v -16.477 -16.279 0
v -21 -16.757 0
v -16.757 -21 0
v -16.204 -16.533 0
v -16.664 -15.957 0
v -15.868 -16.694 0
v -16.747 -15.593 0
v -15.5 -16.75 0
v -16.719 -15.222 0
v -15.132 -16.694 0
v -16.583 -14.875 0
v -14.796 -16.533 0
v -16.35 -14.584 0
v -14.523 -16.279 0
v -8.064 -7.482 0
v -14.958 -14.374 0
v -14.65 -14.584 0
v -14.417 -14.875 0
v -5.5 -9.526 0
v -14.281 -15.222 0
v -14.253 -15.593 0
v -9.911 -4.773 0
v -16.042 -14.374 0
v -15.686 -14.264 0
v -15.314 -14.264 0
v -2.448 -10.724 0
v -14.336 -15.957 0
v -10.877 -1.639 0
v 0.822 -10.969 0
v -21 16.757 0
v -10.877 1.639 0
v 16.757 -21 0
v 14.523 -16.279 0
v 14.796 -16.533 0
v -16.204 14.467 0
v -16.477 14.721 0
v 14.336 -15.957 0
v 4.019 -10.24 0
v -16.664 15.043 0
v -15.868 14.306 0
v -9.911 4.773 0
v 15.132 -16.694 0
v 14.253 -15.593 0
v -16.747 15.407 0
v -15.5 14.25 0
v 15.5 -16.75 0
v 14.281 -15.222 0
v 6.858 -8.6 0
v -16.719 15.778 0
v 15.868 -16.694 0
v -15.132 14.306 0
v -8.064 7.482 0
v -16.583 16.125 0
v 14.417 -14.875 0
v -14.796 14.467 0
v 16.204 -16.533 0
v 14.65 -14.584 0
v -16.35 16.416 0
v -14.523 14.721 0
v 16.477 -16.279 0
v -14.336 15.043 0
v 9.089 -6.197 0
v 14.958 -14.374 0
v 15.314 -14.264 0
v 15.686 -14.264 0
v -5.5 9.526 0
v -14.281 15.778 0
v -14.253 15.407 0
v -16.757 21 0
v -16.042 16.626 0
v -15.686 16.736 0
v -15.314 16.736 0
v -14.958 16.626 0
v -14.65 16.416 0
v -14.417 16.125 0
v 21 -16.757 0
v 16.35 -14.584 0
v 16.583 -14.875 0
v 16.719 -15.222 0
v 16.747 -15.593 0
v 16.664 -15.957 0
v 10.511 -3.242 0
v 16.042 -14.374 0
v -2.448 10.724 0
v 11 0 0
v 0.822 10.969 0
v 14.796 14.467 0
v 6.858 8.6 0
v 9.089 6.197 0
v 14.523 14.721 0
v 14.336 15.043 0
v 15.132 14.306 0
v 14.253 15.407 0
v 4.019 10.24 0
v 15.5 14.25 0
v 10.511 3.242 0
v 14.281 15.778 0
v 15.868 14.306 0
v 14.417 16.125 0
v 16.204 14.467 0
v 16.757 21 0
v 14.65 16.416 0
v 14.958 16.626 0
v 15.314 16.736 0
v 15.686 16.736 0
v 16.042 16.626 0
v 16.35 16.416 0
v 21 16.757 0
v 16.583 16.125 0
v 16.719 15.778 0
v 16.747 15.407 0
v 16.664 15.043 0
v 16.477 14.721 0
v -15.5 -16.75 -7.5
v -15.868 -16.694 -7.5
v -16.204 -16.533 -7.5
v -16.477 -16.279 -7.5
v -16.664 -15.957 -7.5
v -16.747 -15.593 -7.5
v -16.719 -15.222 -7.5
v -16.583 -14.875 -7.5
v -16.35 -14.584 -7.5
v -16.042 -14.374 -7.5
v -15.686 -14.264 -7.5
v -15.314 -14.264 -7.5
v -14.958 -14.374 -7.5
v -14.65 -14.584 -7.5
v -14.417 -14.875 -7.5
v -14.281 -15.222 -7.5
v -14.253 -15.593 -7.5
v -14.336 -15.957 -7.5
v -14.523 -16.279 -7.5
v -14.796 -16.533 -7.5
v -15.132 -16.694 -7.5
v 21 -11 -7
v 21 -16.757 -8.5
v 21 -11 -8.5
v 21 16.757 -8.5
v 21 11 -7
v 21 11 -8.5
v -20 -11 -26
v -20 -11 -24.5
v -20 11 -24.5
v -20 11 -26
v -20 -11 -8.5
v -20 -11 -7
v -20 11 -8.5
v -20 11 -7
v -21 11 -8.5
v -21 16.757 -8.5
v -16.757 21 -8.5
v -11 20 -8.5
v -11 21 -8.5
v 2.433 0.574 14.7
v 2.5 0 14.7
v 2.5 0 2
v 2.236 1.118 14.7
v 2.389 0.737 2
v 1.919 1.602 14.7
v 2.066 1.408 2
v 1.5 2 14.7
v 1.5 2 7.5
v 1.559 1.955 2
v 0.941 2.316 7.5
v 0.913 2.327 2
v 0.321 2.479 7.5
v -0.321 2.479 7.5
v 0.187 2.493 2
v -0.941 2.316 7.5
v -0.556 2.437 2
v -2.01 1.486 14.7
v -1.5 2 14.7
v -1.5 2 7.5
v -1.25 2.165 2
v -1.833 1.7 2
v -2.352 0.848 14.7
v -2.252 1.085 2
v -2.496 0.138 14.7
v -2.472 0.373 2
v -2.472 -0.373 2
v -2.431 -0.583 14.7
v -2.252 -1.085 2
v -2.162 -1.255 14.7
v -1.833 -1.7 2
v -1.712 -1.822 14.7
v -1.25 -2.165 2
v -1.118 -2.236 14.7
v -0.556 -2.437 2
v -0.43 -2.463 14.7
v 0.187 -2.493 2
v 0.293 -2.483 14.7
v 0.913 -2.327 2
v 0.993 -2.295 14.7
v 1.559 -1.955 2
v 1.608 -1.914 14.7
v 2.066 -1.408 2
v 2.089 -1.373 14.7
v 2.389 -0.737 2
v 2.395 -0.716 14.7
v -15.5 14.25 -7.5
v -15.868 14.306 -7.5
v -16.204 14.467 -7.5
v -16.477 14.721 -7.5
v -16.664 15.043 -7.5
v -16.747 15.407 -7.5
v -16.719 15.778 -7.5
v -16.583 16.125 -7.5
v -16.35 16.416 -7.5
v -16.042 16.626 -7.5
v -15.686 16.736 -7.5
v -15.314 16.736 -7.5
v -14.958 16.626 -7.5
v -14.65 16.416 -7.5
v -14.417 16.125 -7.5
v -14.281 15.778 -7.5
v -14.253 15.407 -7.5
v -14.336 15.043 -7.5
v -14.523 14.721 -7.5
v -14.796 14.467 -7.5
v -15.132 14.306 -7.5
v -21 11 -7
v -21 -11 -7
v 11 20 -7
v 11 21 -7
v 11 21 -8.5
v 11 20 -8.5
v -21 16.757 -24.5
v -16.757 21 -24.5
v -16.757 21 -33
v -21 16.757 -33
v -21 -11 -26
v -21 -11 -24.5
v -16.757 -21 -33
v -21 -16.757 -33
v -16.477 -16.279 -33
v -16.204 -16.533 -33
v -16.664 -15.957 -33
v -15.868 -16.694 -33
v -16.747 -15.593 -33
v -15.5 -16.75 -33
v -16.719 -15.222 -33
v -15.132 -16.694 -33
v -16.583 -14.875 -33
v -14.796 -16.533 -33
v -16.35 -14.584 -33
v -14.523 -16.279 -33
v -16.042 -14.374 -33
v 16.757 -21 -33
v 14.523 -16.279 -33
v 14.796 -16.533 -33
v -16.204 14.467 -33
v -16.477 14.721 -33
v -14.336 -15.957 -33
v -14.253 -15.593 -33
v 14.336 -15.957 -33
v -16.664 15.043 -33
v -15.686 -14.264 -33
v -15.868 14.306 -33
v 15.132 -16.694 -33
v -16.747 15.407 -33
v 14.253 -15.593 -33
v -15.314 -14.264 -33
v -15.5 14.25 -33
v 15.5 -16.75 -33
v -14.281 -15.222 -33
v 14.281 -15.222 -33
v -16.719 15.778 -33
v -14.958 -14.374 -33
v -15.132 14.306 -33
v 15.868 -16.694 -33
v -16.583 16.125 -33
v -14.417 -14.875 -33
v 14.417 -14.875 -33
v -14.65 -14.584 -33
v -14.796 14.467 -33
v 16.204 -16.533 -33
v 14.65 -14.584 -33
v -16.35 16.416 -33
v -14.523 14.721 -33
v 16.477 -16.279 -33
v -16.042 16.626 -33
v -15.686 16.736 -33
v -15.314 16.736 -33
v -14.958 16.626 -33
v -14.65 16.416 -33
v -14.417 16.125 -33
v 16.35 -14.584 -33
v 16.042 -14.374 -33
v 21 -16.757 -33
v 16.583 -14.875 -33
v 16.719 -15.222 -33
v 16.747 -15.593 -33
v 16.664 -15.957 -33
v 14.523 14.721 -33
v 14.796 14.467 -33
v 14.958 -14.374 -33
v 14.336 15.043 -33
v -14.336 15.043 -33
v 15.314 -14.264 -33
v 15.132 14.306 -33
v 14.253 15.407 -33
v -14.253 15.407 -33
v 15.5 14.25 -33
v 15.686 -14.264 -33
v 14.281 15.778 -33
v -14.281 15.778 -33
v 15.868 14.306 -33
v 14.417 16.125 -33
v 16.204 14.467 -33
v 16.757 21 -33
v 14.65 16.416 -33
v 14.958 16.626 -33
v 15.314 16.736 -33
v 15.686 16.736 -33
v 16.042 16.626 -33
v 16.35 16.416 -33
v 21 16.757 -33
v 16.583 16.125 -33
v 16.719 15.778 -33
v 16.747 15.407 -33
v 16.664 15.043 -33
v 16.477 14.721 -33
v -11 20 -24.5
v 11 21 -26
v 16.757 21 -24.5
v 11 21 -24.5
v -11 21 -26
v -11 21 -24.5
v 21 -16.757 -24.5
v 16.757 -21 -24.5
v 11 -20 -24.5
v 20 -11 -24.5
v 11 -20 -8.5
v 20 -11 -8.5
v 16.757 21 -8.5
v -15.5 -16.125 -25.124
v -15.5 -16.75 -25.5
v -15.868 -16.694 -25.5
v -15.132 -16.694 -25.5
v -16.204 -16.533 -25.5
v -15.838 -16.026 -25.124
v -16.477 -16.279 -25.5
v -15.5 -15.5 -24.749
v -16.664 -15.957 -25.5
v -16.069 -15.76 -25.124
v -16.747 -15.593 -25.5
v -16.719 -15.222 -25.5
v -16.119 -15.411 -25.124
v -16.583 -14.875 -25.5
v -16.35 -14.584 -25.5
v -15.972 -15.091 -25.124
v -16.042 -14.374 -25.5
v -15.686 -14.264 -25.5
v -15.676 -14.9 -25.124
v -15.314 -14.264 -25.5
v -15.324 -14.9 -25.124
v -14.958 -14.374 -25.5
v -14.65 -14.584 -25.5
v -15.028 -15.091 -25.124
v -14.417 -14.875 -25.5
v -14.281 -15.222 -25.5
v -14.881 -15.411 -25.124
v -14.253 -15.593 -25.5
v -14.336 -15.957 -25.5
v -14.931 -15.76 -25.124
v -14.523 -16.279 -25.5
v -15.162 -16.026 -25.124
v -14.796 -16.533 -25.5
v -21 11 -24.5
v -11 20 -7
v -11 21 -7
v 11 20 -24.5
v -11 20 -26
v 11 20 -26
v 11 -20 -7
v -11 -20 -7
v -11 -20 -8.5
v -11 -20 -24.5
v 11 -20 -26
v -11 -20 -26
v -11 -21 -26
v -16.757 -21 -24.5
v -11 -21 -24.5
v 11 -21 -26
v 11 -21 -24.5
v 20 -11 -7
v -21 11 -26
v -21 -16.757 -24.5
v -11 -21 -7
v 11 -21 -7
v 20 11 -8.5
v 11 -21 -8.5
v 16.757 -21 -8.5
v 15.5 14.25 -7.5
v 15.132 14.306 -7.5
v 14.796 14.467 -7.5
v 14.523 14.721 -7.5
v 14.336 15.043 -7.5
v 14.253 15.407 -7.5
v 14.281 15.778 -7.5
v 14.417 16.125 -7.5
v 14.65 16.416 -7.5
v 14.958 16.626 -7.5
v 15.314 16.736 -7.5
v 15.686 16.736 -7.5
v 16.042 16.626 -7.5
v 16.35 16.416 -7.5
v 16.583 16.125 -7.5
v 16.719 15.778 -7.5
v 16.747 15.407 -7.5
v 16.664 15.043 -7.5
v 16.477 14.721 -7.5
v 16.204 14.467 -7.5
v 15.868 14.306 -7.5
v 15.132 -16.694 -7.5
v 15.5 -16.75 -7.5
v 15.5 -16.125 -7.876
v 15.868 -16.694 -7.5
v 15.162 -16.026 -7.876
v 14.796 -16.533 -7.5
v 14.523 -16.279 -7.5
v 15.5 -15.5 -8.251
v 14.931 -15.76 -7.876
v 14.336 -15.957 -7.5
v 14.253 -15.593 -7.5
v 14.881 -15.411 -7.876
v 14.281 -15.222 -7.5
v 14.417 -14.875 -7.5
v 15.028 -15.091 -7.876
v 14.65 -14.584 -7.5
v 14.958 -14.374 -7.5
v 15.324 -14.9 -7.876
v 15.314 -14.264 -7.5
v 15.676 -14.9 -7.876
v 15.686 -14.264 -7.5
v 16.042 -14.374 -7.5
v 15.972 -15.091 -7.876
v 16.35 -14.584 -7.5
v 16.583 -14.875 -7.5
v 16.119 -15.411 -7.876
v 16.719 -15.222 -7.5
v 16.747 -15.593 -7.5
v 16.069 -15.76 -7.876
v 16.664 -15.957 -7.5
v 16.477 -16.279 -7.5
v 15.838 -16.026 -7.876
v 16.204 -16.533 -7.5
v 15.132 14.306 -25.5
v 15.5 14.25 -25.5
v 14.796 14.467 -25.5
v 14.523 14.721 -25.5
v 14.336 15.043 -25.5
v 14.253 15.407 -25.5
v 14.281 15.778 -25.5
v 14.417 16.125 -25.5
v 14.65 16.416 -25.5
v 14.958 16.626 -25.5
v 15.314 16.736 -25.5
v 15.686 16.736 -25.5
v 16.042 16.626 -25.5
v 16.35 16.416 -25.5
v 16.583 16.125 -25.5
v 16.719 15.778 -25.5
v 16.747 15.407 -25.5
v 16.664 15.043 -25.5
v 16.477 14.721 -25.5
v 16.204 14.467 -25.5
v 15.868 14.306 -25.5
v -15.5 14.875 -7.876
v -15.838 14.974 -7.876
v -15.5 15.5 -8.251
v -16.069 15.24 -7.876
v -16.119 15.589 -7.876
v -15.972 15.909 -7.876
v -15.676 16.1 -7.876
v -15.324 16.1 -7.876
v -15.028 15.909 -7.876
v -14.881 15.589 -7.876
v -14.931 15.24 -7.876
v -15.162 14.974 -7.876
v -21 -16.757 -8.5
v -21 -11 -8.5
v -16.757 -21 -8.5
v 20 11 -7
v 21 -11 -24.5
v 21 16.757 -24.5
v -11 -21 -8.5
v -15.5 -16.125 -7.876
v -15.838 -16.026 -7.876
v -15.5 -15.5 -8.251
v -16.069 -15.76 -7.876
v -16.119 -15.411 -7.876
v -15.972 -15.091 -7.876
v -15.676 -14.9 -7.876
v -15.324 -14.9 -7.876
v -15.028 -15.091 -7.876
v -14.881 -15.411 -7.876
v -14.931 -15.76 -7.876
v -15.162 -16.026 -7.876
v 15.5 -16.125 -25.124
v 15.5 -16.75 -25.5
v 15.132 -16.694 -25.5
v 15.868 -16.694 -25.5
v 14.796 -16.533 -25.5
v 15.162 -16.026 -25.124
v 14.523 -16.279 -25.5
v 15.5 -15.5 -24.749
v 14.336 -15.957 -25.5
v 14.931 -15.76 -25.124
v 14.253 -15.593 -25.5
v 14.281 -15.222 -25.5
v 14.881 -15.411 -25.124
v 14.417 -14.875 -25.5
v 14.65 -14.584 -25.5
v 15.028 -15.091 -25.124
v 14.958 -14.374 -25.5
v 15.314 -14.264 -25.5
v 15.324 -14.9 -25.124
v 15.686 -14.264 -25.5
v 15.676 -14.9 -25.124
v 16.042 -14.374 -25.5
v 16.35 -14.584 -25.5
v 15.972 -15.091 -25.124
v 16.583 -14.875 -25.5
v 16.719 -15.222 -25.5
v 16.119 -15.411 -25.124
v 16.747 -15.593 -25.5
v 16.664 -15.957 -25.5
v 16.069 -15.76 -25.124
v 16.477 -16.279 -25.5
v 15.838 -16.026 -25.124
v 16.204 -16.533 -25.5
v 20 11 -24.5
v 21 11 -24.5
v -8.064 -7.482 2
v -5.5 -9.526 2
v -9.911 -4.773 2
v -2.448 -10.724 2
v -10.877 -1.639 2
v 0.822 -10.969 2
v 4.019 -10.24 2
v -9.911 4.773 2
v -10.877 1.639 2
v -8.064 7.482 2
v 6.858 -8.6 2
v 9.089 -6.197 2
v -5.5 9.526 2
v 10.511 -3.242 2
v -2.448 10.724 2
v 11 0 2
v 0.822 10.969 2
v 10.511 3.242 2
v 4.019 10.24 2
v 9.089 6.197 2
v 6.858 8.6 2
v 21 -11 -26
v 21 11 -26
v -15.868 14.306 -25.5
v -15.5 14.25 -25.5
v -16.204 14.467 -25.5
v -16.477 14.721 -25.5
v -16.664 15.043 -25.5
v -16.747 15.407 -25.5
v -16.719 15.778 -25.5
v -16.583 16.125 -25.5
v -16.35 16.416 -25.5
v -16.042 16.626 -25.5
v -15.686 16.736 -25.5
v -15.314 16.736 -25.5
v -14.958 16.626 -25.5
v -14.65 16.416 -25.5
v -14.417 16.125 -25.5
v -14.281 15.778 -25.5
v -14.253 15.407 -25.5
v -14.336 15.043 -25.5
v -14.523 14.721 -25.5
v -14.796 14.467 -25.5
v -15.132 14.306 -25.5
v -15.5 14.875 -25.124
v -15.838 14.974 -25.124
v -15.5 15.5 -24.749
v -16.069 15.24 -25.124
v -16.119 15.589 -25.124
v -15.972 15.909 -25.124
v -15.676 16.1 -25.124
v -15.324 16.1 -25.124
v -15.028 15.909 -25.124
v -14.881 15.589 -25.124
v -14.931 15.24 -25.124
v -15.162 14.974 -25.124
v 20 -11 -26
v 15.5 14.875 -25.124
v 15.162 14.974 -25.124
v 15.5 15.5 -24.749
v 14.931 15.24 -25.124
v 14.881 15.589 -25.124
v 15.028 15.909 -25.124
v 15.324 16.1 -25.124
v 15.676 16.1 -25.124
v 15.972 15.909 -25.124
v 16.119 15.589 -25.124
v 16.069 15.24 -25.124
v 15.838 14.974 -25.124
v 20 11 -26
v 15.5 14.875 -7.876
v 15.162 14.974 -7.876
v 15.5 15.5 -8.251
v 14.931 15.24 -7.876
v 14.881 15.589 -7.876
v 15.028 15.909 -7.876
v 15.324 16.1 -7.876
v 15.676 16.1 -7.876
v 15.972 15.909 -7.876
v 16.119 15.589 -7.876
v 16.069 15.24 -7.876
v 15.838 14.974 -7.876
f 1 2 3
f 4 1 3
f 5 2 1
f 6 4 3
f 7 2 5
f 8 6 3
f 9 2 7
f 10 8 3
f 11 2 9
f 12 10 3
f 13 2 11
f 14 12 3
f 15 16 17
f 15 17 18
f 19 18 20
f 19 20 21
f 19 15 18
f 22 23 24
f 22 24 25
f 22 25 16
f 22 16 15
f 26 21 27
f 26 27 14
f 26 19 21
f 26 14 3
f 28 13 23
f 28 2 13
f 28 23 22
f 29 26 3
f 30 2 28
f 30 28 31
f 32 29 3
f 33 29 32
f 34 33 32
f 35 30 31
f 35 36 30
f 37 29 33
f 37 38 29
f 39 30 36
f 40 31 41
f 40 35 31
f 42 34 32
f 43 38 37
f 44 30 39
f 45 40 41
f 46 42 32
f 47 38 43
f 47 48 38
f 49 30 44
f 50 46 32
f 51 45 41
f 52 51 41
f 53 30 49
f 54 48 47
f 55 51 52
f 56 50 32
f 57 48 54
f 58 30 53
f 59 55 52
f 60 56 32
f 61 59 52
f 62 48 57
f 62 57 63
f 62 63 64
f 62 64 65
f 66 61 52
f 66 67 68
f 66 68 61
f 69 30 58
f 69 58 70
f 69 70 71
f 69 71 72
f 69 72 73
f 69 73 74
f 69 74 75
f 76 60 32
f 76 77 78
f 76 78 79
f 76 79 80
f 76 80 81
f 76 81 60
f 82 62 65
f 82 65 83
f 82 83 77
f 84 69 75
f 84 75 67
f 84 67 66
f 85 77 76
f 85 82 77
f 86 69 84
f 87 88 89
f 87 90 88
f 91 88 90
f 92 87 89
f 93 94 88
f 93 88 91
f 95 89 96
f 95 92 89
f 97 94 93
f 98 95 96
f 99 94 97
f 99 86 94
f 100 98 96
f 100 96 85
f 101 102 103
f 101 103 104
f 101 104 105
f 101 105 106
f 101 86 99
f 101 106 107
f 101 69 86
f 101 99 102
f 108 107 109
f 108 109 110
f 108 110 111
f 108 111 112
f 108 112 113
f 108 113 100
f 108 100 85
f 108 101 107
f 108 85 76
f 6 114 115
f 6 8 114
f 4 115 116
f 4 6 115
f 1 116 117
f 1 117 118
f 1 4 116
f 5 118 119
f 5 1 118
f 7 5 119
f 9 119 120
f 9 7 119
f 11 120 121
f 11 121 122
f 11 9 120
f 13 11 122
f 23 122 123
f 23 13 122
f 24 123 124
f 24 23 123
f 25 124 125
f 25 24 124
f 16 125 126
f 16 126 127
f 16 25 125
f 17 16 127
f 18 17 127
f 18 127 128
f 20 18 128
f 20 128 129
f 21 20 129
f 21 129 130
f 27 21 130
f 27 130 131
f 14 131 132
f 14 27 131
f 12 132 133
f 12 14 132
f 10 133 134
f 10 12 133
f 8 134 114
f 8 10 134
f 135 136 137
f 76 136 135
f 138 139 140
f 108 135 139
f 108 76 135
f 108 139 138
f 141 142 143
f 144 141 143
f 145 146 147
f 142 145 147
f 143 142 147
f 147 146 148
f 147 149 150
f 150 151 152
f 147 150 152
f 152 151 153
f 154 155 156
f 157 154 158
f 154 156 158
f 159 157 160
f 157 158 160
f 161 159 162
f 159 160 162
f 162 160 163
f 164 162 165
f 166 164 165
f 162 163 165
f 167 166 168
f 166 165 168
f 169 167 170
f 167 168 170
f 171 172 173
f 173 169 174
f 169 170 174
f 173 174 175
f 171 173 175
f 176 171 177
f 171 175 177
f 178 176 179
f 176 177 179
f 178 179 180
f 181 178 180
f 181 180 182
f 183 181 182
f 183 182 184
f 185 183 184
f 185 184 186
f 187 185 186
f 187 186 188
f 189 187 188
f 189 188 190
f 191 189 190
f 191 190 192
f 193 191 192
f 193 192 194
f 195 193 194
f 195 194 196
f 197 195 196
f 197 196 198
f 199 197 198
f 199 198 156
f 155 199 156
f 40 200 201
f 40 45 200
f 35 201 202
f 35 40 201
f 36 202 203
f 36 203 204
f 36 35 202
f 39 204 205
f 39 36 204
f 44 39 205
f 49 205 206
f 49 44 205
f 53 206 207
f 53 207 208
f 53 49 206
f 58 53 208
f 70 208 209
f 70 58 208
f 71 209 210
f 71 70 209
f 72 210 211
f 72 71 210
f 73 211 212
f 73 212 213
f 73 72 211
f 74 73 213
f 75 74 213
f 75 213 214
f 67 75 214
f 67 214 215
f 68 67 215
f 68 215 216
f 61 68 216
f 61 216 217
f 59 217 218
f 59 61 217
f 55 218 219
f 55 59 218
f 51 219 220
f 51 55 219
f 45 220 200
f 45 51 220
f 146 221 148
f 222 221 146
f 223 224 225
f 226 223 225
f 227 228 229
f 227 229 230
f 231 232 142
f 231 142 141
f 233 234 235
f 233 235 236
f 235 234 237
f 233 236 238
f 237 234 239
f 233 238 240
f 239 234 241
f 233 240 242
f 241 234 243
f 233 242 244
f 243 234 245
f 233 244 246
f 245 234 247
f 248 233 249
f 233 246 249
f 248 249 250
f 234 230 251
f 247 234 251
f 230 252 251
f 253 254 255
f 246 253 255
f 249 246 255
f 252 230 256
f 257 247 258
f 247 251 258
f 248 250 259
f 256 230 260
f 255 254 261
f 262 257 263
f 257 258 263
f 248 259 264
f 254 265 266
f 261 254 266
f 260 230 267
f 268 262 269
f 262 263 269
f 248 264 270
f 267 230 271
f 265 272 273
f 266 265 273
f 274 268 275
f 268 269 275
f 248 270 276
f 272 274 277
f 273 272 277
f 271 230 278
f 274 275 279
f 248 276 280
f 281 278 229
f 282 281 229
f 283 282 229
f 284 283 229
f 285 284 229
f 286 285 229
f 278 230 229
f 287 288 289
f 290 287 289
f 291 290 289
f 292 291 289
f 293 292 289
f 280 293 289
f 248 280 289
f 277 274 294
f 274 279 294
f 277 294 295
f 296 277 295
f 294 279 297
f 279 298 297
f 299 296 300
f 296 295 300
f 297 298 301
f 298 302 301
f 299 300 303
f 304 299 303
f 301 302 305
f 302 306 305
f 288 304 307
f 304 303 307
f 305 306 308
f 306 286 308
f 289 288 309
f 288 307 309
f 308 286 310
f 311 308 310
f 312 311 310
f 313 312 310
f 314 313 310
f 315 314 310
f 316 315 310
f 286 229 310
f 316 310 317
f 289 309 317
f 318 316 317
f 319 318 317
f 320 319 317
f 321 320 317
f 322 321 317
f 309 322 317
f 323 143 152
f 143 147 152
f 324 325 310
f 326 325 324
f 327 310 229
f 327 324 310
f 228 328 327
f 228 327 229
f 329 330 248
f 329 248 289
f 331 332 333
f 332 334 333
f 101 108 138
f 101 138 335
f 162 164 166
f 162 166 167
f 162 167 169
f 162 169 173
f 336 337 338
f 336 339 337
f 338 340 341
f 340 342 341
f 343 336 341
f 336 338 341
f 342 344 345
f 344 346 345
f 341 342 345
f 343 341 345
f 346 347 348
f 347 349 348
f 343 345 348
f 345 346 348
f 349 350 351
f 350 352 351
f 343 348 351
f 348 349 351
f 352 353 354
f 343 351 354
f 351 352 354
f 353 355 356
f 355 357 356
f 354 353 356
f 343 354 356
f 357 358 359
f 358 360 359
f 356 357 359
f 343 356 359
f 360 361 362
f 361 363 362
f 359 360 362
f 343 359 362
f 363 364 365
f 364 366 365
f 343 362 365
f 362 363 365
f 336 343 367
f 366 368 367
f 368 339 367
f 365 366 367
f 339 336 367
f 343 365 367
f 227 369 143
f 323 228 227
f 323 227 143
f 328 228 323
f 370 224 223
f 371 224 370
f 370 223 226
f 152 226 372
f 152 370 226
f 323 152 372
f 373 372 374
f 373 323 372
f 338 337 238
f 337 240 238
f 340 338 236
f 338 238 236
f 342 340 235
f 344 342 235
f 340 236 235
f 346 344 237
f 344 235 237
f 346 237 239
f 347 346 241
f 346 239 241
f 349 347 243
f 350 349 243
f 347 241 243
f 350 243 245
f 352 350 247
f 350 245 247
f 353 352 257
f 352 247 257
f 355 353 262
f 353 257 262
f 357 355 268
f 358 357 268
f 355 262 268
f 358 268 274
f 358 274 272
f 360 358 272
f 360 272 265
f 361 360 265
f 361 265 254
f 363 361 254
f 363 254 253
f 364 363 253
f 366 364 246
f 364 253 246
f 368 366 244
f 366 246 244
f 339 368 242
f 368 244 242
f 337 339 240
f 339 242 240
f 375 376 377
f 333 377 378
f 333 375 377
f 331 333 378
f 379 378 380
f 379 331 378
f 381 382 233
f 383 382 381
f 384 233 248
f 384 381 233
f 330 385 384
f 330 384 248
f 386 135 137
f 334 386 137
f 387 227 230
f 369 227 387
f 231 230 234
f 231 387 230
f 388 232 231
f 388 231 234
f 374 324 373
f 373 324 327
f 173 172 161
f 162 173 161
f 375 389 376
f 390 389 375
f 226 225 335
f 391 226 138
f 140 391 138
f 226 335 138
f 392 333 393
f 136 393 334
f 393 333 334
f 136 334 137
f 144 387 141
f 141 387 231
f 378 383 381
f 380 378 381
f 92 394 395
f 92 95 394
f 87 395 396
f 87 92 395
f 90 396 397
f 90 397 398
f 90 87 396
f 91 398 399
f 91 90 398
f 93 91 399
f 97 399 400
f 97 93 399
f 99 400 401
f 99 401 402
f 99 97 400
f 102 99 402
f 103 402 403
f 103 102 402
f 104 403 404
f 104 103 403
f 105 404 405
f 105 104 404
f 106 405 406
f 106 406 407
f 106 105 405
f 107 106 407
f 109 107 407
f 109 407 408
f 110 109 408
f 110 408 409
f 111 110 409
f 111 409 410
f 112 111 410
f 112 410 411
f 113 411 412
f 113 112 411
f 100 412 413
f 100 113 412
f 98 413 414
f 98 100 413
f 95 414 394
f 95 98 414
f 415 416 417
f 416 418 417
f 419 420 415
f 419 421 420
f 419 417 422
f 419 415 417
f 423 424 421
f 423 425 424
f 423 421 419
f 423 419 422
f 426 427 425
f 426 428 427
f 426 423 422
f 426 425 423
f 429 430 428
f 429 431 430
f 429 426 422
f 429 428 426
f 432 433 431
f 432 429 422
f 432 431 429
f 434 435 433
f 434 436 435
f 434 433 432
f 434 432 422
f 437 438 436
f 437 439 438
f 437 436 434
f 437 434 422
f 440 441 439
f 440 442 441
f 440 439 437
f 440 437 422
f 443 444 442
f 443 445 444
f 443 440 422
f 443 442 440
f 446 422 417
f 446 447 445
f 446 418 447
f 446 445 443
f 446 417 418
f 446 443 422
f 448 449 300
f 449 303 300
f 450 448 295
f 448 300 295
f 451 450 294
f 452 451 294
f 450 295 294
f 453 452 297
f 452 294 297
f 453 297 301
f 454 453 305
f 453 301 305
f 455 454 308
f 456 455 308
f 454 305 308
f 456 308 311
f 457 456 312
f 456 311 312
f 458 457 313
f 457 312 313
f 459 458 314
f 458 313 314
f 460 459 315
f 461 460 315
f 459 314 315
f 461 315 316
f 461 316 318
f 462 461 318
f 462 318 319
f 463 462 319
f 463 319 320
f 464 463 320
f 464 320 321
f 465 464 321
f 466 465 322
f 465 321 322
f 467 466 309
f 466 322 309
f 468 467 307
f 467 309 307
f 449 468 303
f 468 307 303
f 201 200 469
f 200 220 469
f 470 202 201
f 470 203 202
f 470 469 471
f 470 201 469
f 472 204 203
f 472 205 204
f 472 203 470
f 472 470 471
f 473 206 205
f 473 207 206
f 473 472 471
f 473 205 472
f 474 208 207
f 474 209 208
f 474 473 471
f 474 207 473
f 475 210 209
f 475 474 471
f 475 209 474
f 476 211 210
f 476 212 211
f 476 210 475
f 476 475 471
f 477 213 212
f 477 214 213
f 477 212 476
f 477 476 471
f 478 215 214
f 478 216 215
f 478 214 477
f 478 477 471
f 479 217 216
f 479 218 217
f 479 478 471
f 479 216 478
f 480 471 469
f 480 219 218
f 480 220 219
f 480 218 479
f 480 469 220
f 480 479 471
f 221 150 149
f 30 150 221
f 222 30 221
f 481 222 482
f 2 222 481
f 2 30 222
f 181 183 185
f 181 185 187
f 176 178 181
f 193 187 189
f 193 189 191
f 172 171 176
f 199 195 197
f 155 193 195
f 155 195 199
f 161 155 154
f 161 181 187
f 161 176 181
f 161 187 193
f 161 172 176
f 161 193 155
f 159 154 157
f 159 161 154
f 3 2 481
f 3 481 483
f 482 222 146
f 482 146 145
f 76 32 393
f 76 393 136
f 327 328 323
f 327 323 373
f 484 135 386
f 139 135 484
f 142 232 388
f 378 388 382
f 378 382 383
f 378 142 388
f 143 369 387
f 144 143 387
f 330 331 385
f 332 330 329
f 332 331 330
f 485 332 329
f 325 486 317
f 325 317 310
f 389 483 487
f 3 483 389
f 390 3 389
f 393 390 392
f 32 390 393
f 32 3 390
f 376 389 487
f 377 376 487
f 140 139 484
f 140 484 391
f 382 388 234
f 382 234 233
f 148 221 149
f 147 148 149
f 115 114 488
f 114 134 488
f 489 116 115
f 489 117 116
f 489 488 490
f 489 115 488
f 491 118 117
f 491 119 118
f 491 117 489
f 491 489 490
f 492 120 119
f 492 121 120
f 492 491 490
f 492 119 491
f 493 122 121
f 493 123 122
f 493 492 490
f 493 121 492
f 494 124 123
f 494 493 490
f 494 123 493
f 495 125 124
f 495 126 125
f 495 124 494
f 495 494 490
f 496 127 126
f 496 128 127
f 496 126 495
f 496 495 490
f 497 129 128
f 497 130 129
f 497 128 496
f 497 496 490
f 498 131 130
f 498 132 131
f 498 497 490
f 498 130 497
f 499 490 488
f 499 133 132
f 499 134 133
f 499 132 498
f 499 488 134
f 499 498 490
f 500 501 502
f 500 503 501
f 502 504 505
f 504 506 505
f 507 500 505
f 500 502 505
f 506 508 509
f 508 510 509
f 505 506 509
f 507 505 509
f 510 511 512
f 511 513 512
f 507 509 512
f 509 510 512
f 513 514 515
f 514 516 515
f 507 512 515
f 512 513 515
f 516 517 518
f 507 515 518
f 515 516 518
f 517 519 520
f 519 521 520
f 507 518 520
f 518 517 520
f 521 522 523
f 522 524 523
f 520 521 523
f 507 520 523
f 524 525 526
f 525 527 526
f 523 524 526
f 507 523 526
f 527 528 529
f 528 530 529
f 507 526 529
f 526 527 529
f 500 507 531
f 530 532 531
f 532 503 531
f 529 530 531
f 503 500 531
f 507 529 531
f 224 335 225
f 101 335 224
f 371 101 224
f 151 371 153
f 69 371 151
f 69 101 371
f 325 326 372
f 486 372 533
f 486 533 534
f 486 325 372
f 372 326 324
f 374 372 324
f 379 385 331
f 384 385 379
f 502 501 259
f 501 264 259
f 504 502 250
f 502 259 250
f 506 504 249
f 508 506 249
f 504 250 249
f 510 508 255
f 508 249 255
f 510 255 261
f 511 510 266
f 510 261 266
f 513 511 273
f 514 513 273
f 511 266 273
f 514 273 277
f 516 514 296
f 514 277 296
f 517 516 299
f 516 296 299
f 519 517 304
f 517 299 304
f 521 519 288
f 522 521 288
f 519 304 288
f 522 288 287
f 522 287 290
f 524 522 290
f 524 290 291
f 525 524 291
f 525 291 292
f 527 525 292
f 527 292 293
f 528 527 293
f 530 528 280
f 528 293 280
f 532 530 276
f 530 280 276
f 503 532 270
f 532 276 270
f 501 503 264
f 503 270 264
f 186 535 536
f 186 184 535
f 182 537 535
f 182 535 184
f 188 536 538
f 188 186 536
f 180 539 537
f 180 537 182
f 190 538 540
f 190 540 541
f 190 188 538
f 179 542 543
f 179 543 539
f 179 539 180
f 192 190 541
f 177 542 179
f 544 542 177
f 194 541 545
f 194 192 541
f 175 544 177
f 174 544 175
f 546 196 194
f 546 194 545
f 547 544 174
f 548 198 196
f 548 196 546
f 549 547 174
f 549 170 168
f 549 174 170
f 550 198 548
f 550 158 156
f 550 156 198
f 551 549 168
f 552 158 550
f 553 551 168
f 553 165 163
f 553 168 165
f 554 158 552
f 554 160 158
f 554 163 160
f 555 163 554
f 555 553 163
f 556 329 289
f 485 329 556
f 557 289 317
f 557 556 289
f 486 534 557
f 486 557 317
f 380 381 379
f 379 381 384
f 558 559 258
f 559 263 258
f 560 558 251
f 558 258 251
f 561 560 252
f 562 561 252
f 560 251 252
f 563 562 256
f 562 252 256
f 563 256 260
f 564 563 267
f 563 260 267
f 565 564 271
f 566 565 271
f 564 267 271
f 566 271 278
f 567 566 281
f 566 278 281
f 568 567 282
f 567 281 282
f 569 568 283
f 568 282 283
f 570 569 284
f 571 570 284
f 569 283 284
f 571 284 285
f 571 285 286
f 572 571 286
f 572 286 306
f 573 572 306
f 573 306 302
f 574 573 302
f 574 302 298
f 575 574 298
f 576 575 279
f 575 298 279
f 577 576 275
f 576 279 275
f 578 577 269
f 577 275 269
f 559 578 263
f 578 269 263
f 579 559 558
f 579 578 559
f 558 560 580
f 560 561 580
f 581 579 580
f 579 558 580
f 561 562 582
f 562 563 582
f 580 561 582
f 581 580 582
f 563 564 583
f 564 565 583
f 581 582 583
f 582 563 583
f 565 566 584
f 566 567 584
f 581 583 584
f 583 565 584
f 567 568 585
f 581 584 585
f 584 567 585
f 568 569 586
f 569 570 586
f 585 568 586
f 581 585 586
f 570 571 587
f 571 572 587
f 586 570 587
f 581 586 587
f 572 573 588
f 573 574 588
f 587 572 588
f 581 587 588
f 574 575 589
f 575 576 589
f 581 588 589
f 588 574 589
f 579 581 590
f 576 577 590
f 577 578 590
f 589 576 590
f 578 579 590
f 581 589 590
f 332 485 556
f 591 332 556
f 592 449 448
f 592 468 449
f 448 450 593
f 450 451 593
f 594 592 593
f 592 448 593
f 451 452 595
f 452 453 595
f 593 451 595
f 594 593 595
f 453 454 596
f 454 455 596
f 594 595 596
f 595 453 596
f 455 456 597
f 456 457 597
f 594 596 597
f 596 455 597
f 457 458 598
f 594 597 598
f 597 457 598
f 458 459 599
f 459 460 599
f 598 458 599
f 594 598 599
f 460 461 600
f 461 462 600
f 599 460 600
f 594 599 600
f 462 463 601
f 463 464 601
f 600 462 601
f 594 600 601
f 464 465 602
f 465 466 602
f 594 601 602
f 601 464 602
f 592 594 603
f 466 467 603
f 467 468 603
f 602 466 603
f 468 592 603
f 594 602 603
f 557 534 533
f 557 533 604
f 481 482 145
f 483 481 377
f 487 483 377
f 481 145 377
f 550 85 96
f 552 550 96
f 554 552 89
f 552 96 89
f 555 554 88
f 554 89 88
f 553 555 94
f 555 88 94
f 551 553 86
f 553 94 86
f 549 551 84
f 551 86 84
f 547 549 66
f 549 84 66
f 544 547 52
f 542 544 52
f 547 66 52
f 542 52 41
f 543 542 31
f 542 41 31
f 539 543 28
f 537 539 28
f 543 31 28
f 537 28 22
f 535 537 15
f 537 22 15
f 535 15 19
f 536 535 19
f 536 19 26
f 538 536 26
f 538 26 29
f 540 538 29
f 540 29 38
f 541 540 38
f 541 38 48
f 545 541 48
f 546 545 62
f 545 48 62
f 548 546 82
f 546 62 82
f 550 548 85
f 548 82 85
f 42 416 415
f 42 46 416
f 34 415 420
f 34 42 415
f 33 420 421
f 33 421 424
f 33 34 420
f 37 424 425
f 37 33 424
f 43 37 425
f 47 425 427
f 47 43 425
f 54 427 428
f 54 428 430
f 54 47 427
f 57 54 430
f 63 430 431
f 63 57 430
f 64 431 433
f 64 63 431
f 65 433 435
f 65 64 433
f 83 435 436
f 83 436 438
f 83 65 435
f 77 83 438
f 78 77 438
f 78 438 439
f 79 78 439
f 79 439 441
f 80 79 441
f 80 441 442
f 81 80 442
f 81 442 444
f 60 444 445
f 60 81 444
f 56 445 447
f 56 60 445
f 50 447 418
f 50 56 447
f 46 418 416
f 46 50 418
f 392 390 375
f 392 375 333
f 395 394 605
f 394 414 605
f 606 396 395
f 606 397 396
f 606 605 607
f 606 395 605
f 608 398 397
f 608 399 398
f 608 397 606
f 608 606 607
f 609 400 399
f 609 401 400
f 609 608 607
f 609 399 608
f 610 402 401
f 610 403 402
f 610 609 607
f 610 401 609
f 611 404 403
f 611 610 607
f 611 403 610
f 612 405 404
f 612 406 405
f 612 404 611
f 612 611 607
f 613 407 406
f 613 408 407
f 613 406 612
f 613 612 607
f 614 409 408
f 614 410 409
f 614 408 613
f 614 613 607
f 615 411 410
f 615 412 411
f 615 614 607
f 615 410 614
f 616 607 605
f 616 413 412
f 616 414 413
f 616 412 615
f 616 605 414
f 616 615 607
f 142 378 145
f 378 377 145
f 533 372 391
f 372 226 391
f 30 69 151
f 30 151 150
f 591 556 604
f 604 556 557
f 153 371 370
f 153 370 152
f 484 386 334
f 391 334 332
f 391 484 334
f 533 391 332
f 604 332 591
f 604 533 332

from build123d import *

# Parameters (mm, degrees)
BOSS_EXTRUDE1_DEPTH            = 33
M3X0_5_TAPPED_HOLE1_AT_2_COUNT = 2
M3X0_5_TAPPED_HOLE1_AT_2_PITCH = 43.840620434
M3X0_5_TAPPED_HOLE1_AT_3_COUNT = 2
M3X0_5_TAPPED_HOLE1_AT_3_PITCH = 31
M3X0_5_TAPPED_HOLE1_AT_4_COUNT = 2
M3X0_5_TAPPED_HOLE1_AT_4_PITCH = 31
SKETCH4_OUTSIDE_W              = 57.59
SKETCH4_OUTSIDE_H              = 57.59
CUT_EXTRUDE1_DEPTH             = 8
SKETCH5_W                      = 19
SKETCH5_H                      = 22
CUT_EXTRUDE2_DEPTH             = 1
CIRPATTERN1_COUNT              = 4
SKETCH7_R                      = 11
BOSS_EXTRUDE2_DEPTH            = 2
SKETCH8_R                      = 2.5
BOSS_EXTRUDE3_DEPTH            = 12.7
CUT_EXTRUDE3_DEPTH             = 7.2


with BuildPart() as part:
    # Sketch1 → Boss-Extrude1 (new body)
    with BuildSketch(Plane.XY):
        Polygon((16.757359313, 21), (-16.757359313, 21), (-21, 16.757359313), (-21, -16.757359313), (-16.757359313, -21), (16.757359313, -21), (21, -16.757359313), (21, 16.757359313), align=None)
    extrude(amount=-BOSS_EXTRUDE1_DEPTH)

    # Sketch2 → M3x0.5 Tapped Hole1 (revolve, cut)
    with BuildSketch(Plane(origin=(-15.5, 15.5, 0), x_dir=(0, -1, 0), z_dir=(1, 0, 0))):
        Polygon((0, 0), (0, 8.251075774), (1.25, 7.5), (1.25, 0), align=None)
    m3x0_5_tapped_hole1 = revolve(axis=Axis((-15.5, 15.5, 6.35), (0, 0, -1)), mode=Mode.SUBTRACT)

    # M3x0.5 Tapped Hole1 at 2: M3x0.5 Tapped Hole1 ×2
    with Locations(*[Vector(0.707106781, -0.707106781, 0) * (i * M3X0_5_TAPPED_HOLE1_AT_2_PITCH) for i in range(1, M3X0_5_TAPPED_HOLE1_AT_2_COUNT)]):
        add(m3x0_5_tapped_hole1, mode=Mode.SUBTRACT)

    # M3x0.5 Tapped Hole1 at 3: M3x0.5 Tapped Hole1 ×2
    with Locations(*[(i * M3X0_5_TAPPED_HOLE1_AT_3_PITCH, 0, 0) for i in range(1, M3X0_5_TAPPED_HOLE1_AT_3_COUNT)]):
        add(m3x0_5_tapped_hole1, mode=Mode.SUBTRACT)

    # M3x0.5 Tapped Hole1 at 4: M3x0.5 Tapped Hole1 ×2
    with Locations(*[(0, -i * M3X0_5_TAPPED_HOLE1_AT_4_PITCH, 0) for i in range(1, M3X0_5_TAPPED_HOLE1_AT_4_COUNT)]):
        add(m3x0_5_tapped_hole1, mode=Mode.SUBTRACT)

    # Sketch4 outside → Cut-Extrude1 (cut, symmetric)
    with BuildSketch(Plane.XY.offset(-16.5)):
        Rectangle(SKETCH4_OUTSIDE_W, SKETCH4_OUTSIDE_H)
        Polygon((11, -20), (-11, -20), (-20, -11), (-20, 11), (-11, 20), (11, 20), (20, 11), (20, -11), align=None, mode=Mode.SUBTRACT)
    extrude(amount=CUT_EXTRUDE1_DEPTH, both=True, mode=Mode.SUBTRACT)

    # Sketch5 → Cut-Extrude2 (cut)
    with BuildSketch(Plane(origin=(21, 0, 0), x_dir=(0, 0, -1), z_dir=(1, 0, 0))):
        with Locations((16.5, 0)):
            Rectangle(SKETCH5_W, SKETCH5_H)
    cut_extrude2 = extrude(amount=-CUT_EXTRUDE2_DEPTH, mode=Mode.SUBTRACT)

    # CirPattern1: Cut-Extrude2 ×4 about axis
    cirpattern1_axis = Axis((0, 0, 0), (0, 0, 1))
    for i in range(1, CIRPATTERN1_COUNT):
        add(cut_extrude2.rotate(cirpattern1_axis, i * 360 / CIRPATTERN1_COUNT), mode=Mode.SUBTRACT)

    # Sketch7 → Boss-Extrude2 (add)
    with BuildSketch(Plane.XY):
        Circle(SKETCH7_R)
    extrude(amount=BOSS_EXTRUDE2_DEPTH)

    # Sketch8 → Boss-Extrude3 (add)
    with BuildSketch(Plane.XY.offset(2)):
        Circle(SKETCH8_R)
    extrude(amount=BOSS_EXTRUDE3_DEPTH)

    # Sketch9 → Cut-Extrude3 (cut)
    with BuildSketch(Plane.XY.offset(14.7)):
        with BuildLine():
            Line((-1.5, 2), (1.5, 2))
            ThreePointArc((1.5, 2), (0, 2.5), (-1.5, 2))
        make_face()
    extrude(amount=-CUT_EXTRUDE3_DEPTH, mode=Mode.SUBTRACT)

    # Mirror1: M3x0.5 Tapped Hole1 across plane
    add(m3x0_5_tapped_hole1.mirror(Plane.XY.offset(-16.5)), mode=Mode.SUBTRACT)

    # Mirror1 copy 1 sketch → Mirror1 copy 1 (revolve, cut)
    with BuildSketch(Plane(origin=(15.5, -15.5, -33), x_dir=(0, -1, 0), z_dir=(1, 0, 0))):
        Polygon((0, 0), (0, -8.251075774), (1.25, -7.5), (1.25, 0), align=None)
    revolve(axis=Axis((15.5, -15.5, -39.35), (0, 0, -1)), mode=Mode.SUBTRACT)

    # Mirror1 copy 2 sketch → Mirror1 copy 2 (revolve, cut)
    with BuildSketch(Plane(origin=(15.5, 15.5, -33), x_dir=(0, -1, 0), z_dir=(1, 0, 0))):
        Polygon((0, 0), (0, -8.251075774), (1.25, -7.5), (1.25, 0), align=None)
    revolve(axis=Axis((15.5, 15.5, -39.35), (0, 0, -1)), mode=Mode.SUBTRACT)

    # Mirror1 copy 3 sketch → Mirror1 copy 3 (revolve, cut)
    with BuildSketch(Plane(origin=(-15.5, -15.5, -33), x_dir=(0, -1, 0), z_dir=(1, 0, 0))):
        Polygon((0, 0), (0, -8.251075774), (1.25, -7.5), (1.25, 0), align=None)
    revolve(axis=Axis((-15.5, -15.5, -39.35), (0, 0, -1)), mode=Mode.SUBTRACT)


solid = part.part
